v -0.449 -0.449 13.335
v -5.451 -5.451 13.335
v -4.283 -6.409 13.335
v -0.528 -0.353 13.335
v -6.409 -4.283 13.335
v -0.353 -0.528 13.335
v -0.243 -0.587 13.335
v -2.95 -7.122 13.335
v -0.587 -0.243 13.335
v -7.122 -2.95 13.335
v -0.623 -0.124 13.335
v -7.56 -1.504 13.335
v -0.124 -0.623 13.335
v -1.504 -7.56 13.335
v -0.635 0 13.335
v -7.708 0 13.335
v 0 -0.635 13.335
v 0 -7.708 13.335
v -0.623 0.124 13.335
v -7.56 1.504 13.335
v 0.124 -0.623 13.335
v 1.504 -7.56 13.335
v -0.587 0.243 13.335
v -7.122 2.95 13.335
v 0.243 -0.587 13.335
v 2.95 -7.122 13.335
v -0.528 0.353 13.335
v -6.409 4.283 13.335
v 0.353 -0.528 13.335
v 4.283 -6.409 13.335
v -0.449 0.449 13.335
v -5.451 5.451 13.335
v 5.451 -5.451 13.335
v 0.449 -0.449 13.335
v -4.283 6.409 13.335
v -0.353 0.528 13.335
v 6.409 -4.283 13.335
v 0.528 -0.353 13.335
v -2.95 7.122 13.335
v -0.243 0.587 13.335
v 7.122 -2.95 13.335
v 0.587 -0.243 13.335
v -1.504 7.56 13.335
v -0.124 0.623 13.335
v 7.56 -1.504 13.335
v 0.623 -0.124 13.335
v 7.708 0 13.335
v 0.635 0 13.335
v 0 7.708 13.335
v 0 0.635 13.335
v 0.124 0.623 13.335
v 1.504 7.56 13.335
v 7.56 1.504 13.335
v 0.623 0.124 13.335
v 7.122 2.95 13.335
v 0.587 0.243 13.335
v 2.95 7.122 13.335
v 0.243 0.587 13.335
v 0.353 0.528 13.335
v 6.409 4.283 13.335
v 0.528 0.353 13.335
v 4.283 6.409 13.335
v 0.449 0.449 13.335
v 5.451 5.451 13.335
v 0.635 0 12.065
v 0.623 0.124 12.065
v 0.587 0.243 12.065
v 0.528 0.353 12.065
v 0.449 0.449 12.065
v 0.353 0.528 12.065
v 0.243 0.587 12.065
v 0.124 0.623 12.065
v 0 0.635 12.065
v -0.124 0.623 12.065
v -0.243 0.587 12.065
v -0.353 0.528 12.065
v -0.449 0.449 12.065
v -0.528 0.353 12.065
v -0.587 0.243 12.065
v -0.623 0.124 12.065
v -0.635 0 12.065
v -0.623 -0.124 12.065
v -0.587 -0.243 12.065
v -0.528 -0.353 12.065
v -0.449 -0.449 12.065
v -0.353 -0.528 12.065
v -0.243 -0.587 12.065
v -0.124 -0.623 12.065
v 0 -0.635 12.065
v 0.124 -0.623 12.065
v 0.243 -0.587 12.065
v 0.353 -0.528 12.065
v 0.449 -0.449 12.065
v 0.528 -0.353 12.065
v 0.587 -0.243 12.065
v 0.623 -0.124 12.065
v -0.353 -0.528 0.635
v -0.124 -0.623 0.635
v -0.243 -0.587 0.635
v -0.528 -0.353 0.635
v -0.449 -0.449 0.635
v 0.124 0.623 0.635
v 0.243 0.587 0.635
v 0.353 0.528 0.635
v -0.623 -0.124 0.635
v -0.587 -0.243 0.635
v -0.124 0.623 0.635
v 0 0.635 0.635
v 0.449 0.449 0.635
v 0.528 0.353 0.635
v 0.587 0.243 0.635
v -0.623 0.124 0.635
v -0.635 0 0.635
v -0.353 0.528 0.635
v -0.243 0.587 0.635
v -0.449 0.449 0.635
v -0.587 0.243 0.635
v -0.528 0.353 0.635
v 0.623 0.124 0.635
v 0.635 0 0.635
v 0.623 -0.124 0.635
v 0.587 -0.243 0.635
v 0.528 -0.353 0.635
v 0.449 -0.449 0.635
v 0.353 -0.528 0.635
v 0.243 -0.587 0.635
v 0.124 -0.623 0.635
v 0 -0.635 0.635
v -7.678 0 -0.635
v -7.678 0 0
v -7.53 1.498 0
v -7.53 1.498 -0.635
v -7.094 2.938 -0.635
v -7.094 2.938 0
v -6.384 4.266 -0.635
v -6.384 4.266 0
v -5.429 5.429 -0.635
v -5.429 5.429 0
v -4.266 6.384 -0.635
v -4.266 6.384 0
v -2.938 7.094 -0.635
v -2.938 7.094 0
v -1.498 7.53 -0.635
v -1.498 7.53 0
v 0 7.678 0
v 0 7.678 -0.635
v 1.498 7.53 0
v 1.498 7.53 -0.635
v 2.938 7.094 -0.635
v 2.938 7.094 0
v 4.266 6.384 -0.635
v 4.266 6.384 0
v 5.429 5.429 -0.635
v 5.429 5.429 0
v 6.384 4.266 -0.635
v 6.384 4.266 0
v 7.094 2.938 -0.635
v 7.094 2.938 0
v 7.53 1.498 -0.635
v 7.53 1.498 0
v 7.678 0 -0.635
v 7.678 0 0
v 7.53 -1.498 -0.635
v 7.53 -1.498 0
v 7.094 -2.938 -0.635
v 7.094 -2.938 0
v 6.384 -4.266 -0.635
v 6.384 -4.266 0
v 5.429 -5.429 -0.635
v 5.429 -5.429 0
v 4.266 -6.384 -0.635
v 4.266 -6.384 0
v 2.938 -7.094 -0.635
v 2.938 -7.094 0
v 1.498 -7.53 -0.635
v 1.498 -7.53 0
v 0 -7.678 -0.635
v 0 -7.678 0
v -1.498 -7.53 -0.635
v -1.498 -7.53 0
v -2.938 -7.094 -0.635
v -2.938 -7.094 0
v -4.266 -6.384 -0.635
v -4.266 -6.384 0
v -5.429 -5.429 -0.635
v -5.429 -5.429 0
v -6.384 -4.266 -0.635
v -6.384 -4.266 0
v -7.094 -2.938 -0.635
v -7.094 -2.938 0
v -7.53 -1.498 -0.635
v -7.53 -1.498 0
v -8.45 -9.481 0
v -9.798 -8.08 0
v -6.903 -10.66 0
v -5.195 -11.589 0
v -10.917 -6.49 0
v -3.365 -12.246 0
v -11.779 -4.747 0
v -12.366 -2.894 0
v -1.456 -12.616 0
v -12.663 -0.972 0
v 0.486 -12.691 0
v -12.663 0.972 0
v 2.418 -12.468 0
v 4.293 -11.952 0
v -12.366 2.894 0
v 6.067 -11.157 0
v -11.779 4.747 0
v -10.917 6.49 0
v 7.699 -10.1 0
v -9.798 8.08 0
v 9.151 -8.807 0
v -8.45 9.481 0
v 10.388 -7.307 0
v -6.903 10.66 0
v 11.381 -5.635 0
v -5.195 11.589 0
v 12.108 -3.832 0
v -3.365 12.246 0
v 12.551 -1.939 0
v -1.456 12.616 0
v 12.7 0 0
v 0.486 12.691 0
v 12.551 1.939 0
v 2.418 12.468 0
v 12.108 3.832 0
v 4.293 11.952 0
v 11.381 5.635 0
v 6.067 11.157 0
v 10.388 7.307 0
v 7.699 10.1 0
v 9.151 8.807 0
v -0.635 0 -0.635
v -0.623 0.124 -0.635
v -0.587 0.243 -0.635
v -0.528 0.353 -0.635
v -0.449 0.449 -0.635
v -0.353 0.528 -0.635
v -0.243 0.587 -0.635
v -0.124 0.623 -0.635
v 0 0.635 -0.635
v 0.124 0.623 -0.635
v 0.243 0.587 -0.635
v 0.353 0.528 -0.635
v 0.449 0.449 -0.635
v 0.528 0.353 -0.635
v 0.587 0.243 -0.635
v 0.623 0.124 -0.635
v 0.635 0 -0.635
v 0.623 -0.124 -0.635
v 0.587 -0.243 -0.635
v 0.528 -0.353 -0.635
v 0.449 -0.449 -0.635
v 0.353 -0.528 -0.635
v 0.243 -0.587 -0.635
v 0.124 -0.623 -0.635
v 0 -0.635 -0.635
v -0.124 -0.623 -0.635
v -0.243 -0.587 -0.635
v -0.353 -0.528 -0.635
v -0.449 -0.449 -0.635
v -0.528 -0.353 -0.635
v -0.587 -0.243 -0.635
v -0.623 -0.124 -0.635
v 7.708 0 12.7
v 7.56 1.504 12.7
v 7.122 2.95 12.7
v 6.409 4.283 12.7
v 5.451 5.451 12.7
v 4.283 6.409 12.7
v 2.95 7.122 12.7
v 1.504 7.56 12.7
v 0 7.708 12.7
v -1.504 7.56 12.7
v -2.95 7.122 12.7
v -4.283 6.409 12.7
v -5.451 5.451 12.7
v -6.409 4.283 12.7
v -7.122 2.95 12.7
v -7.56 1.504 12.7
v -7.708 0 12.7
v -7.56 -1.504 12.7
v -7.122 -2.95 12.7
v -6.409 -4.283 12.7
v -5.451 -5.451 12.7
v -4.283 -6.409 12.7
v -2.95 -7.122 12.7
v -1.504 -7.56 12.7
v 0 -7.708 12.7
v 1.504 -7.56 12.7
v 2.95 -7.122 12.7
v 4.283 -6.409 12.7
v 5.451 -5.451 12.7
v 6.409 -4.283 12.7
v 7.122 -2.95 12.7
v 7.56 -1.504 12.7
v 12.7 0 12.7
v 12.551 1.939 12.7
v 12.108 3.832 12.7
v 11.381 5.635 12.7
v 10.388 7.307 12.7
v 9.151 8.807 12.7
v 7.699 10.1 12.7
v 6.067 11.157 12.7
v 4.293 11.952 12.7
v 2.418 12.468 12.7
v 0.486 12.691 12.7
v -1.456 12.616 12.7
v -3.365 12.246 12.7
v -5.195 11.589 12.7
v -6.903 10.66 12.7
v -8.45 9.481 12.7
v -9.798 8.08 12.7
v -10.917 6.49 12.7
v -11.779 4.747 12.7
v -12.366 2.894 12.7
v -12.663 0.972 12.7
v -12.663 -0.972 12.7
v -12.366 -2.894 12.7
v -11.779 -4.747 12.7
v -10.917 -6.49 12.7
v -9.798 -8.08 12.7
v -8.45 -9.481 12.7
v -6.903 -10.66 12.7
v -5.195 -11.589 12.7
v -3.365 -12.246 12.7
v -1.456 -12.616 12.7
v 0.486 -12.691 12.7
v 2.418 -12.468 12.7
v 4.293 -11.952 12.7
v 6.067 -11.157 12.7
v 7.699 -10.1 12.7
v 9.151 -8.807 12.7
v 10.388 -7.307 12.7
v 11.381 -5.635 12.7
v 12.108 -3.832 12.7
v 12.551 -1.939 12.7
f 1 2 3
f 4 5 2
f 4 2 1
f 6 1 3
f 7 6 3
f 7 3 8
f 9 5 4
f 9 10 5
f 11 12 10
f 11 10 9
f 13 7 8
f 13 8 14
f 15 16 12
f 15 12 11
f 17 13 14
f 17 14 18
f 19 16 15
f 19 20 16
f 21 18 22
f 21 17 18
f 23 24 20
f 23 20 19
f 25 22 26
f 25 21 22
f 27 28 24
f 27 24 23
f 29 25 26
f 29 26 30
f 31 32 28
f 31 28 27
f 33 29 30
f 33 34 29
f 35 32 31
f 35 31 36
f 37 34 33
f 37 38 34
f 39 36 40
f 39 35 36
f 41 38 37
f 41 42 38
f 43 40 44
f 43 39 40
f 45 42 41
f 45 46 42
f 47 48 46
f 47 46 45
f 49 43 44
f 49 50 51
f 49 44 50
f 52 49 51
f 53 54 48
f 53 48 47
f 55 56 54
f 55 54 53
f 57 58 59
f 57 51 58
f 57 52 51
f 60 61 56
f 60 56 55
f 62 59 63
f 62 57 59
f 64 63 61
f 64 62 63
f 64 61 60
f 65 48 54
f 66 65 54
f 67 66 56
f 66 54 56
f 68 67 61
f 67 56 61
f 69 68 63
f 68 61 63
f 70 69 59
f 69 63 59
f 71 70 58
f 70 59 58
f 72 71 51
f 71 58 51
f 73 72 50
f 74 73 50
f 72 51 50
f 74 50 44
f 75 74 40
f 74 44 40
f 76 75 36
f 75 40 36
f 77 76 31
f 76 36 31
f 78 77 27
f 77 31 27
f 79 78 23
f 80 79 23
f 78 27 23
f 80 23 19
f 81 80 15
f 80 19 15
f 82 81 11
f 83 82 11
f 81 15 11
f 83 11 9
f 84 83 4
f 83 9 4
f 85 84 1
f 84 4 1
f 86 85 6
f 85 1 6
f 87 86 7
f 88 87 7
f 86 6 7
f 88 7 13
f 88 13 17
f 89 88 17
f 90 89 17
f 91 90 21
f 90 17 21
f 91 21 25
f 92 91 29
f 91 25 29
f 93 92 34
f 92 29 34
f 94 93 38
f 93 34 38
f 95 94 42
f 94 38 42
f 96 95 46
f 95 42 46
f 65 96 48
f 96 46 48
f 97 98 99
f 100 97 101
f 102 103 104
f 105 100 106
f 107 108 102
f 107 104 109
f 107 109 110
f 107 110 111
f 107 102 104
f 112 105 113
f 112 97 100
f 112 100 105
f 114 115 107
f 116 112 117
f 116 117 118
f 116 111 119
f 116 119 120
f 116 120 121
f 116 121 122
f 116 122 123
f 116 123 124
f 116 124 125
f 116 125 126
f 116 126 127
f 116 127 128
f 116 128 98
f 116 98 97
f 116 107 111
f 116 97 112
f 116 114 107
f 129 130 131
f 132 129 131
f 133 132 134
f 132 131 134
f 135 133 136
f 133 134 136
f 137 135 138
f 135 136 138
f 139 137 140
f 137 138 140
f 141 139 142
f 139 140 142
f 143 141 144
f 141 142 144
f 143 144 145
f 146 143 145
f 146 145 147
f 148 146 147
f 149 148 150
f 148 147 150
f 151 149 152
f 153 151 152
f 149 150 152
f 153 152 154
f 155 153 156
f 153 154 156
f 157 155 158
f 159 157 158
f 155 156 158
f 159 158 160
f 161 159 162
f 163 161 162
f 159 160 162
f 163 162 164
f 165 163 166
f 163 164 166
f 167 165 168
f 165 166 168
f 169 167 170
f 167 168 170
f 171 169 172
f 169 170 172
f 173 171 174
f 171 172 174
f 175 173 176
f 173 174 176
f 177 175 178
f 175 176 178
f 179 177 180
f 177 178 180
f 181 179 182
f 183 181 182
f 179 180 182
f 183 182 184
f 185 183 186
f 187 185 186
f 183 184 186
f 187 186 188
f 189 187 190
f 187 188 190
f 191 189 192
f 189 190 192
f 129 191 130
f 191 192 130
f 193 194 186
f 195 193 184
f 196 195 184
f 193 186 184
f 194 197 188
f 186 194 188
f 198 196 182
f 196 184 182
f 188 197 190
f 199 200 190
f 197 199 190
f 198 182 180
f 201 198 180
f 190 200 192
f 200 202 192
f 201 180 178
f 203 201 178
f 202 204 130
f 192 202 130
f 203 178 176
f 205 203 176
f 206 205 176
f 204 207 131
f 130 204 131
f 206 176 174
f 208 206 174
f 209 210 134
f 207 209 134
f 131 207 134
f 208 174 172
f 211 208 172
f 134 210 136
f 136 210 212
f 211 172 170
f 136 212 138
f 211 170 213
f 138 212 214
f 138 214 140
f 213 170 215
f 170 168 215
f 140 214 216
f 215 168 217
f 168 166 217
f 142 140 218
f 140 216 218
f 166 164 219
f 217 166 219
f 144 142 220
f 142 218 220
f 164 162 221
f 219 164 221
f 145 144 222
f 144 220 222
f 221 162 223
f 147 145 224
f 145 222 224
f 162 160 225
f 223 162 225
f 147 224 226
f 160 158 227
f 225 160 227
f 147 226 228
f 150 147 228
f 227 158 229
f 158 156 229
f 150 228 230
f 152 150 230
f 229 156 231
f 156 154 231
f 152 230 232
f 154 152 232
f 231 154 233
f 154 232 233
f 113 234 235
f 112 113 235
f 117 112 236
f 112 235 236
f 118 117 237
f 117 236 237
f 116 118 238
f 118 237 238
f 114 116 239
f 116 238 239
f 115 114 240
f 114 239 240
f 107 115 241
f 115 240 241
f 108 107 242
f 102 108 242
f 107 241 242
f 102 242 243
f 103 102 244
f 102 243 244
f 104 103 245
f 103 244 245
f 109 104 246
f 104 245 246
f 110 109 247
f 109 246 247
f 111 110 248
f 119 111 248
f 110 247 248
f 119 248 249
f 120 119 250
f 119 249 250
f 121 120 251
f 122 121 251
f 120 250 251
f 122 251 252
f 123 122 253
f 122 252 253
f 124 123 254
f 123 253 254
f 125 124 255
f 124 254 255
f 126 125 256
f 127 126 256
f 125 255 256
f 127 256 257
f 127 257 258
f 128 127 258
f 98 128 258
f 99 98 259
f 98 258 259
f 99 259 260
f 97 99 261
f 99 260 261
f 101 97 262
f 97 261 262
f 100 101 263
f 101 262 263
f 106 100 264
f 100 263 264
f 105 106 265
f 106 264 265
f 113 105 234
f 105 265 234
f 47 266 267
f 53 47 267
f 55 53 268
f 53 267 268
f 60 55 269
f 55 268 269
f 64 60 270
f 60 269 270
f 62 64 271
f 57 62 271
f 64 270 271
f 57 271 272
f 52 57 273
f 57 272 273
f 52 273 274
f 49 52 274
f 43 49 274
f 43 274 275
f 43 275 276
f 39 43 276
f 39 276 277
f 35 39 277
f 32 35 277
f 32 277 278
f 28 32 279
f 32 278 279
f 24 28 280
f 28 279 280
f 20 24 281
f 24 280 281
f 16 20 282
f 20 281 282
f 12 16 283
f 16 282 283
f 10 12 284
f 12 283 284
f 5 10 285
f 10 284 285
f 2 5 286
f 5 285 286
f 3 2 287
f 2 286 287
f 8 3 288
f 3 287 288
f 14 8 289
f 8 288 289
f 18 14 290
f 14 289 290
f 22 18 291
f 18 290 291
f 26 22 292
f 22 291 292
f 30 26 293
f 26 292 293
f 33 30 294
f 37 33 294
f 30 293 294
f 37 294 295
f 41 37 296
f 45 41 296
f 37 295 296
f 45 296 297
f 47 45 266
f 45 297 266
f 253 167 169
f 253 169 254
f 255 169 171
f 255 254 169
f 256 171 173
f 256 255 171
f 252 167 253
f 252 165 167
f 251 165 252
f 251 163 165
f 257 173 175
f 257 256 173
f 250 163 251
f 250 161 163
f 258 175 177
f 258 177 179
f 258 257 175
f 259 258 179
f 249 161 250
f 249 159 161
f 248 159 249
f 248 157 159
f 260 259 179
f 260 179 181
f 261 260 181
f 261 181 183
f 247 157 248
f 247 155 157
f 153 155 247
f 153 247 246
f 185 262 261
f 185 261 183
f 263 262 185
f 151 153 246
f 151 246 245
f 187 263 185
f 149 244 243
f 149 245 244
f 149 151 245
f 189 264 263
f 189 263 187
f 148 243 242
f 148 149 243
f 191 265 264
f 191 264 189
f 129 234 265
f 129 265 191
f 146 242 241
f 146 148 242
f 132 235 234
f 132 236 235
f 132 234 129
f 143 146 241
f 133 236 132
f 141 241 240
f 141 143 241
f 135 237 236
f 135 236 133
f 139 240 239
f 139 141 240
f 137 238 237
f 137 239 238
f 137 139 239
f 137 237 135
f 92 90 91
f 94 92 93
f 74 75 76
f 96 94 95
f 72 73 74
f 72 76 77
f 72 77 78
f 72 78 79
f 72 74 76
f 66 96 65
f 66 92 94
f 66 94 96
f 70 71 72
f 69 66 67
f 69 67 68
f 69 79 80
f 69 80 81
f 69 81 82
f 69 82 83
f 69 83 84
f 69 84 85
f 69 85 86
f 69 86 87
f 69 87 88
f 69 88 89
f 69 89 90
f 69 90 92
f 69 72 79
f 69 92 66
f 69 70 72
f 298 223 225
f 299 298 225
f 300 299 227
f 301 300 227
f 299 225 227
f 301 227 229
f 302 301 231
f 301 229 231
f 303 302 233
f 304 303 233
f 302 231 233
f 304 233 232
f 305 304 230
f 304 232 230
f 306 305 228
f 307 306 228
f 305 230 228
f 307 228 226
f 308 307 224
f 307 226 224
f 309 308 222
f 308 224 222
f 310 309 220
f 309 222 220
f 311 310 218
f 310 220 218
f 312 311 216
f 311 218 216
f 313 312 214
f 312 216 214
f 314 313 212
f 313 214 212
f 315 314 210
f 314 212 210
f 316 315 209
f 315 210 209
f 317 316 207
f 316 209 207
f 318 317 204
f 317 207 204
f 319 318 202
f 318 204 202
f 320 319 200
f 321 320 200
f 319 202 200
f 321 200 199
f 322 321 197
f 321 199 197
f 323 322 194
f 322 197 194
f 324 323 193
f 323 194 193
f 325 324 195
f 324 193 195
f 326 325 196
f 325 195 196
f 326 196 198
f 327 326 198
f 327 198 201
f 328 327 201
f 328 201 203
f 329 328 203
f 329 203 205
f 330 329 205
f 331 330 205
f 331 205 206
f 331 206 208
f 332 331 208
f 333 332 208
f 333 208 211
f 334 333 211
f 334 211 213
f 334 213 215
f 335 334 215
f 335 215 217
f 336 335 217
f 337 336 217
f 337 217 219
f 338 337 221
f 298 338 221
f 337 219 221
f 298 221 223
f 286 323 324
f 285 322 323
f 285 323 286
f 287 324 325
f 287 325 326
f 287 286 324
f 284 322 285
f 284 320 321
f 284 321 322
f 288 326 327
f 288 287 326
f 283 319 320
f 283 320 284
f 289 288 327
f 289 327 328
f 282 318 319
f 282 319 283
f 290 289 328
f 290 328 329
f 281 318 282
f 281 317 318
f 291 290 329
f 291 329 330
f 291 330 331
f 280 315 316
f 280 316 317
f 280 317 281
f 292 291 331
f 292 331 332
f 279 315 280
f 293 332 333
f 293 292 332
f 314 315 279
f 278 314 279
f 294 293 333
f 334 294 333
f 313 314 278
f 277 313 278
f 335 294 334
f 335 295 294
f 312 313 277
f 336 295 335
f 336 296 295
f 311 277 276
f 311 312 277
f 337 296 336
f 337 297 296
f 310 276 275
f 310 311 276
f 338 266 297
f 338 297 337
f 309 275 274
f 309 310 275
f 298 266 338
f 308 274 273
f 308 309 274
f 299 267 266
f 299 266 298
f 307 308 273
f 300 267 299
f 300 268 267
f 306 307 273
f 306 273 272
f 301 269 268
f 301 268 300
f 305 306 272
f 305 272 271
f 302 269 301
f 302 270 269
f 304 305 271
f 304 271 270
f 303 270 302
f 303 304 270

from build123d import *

# Parameters (mm, degrees)
SKETCH1_R           = 12.7
BOSS_EXTRUDE1_DEPTH = 12.7
SKETCH2_R           = 7.70834565
BOSS_EXTRUDE2_DEPTH = 0.635
SKETCH3_R           = 7.677981209
BOSS_EXTRUDE3_DEPTH = 0.635
SKETCH4_R           = 0.635
CUT_EXTRUDE1_DEPTH  = 1.27
SKETCH5_R           = 0.635
CUT_EXTRUDE2_DEPTH  = 1.27


with BuildPart() as part:
    # Sketch1 → Boss-Extrude1 (new body)
    with BuildSketch(Plane.XY):
        Circle(SKETCH1_R)
    extrude(amount=BOSS_EXTRUDE1_DEPTH)

    # Sketch2 → Boss-Extrude2 (add)
    with BuildSketch(Plane.XY.offset(12.7)):
        Circle(SKETCH2_R)
    extrude(amount=BOSS_EXTRUDE2_DEPTH)

    # Sketch3 → Boss-Extrude3 (add)
    with BuildSketch(Plane(origin=(0, 0, 0), x_dir=(-1, 0, 0), z_dir=(0, 0, -1))):
        Circle(SKETCH3_R)
    extrude(amount=BOSS_EXTRUDE3_DEPTH)

    # Sketch4 → Cut-Extrude1 (cut)
    with BuildSketch(Plane.XY.offset(13.335)):
        Circle(SKETCH4_R)
    extrude(amount=-CUT_EXTRUDE1_DEPTH, mode=Mode.SUBTRACT)

    # Sketch5 → Cut-Extrude2 (cut)
    with BuildSketch(Plane(origin=(0, 0, -0.635), x_dir=(-1, 0, 0), z_dir=(0, 0, -1))):
        Circle(SKETCH5_R)
    extrude(amount=-CUT_EXTRUDE2_DEPTH, mode=Mode.SUBTRACT)


solid = part.part
